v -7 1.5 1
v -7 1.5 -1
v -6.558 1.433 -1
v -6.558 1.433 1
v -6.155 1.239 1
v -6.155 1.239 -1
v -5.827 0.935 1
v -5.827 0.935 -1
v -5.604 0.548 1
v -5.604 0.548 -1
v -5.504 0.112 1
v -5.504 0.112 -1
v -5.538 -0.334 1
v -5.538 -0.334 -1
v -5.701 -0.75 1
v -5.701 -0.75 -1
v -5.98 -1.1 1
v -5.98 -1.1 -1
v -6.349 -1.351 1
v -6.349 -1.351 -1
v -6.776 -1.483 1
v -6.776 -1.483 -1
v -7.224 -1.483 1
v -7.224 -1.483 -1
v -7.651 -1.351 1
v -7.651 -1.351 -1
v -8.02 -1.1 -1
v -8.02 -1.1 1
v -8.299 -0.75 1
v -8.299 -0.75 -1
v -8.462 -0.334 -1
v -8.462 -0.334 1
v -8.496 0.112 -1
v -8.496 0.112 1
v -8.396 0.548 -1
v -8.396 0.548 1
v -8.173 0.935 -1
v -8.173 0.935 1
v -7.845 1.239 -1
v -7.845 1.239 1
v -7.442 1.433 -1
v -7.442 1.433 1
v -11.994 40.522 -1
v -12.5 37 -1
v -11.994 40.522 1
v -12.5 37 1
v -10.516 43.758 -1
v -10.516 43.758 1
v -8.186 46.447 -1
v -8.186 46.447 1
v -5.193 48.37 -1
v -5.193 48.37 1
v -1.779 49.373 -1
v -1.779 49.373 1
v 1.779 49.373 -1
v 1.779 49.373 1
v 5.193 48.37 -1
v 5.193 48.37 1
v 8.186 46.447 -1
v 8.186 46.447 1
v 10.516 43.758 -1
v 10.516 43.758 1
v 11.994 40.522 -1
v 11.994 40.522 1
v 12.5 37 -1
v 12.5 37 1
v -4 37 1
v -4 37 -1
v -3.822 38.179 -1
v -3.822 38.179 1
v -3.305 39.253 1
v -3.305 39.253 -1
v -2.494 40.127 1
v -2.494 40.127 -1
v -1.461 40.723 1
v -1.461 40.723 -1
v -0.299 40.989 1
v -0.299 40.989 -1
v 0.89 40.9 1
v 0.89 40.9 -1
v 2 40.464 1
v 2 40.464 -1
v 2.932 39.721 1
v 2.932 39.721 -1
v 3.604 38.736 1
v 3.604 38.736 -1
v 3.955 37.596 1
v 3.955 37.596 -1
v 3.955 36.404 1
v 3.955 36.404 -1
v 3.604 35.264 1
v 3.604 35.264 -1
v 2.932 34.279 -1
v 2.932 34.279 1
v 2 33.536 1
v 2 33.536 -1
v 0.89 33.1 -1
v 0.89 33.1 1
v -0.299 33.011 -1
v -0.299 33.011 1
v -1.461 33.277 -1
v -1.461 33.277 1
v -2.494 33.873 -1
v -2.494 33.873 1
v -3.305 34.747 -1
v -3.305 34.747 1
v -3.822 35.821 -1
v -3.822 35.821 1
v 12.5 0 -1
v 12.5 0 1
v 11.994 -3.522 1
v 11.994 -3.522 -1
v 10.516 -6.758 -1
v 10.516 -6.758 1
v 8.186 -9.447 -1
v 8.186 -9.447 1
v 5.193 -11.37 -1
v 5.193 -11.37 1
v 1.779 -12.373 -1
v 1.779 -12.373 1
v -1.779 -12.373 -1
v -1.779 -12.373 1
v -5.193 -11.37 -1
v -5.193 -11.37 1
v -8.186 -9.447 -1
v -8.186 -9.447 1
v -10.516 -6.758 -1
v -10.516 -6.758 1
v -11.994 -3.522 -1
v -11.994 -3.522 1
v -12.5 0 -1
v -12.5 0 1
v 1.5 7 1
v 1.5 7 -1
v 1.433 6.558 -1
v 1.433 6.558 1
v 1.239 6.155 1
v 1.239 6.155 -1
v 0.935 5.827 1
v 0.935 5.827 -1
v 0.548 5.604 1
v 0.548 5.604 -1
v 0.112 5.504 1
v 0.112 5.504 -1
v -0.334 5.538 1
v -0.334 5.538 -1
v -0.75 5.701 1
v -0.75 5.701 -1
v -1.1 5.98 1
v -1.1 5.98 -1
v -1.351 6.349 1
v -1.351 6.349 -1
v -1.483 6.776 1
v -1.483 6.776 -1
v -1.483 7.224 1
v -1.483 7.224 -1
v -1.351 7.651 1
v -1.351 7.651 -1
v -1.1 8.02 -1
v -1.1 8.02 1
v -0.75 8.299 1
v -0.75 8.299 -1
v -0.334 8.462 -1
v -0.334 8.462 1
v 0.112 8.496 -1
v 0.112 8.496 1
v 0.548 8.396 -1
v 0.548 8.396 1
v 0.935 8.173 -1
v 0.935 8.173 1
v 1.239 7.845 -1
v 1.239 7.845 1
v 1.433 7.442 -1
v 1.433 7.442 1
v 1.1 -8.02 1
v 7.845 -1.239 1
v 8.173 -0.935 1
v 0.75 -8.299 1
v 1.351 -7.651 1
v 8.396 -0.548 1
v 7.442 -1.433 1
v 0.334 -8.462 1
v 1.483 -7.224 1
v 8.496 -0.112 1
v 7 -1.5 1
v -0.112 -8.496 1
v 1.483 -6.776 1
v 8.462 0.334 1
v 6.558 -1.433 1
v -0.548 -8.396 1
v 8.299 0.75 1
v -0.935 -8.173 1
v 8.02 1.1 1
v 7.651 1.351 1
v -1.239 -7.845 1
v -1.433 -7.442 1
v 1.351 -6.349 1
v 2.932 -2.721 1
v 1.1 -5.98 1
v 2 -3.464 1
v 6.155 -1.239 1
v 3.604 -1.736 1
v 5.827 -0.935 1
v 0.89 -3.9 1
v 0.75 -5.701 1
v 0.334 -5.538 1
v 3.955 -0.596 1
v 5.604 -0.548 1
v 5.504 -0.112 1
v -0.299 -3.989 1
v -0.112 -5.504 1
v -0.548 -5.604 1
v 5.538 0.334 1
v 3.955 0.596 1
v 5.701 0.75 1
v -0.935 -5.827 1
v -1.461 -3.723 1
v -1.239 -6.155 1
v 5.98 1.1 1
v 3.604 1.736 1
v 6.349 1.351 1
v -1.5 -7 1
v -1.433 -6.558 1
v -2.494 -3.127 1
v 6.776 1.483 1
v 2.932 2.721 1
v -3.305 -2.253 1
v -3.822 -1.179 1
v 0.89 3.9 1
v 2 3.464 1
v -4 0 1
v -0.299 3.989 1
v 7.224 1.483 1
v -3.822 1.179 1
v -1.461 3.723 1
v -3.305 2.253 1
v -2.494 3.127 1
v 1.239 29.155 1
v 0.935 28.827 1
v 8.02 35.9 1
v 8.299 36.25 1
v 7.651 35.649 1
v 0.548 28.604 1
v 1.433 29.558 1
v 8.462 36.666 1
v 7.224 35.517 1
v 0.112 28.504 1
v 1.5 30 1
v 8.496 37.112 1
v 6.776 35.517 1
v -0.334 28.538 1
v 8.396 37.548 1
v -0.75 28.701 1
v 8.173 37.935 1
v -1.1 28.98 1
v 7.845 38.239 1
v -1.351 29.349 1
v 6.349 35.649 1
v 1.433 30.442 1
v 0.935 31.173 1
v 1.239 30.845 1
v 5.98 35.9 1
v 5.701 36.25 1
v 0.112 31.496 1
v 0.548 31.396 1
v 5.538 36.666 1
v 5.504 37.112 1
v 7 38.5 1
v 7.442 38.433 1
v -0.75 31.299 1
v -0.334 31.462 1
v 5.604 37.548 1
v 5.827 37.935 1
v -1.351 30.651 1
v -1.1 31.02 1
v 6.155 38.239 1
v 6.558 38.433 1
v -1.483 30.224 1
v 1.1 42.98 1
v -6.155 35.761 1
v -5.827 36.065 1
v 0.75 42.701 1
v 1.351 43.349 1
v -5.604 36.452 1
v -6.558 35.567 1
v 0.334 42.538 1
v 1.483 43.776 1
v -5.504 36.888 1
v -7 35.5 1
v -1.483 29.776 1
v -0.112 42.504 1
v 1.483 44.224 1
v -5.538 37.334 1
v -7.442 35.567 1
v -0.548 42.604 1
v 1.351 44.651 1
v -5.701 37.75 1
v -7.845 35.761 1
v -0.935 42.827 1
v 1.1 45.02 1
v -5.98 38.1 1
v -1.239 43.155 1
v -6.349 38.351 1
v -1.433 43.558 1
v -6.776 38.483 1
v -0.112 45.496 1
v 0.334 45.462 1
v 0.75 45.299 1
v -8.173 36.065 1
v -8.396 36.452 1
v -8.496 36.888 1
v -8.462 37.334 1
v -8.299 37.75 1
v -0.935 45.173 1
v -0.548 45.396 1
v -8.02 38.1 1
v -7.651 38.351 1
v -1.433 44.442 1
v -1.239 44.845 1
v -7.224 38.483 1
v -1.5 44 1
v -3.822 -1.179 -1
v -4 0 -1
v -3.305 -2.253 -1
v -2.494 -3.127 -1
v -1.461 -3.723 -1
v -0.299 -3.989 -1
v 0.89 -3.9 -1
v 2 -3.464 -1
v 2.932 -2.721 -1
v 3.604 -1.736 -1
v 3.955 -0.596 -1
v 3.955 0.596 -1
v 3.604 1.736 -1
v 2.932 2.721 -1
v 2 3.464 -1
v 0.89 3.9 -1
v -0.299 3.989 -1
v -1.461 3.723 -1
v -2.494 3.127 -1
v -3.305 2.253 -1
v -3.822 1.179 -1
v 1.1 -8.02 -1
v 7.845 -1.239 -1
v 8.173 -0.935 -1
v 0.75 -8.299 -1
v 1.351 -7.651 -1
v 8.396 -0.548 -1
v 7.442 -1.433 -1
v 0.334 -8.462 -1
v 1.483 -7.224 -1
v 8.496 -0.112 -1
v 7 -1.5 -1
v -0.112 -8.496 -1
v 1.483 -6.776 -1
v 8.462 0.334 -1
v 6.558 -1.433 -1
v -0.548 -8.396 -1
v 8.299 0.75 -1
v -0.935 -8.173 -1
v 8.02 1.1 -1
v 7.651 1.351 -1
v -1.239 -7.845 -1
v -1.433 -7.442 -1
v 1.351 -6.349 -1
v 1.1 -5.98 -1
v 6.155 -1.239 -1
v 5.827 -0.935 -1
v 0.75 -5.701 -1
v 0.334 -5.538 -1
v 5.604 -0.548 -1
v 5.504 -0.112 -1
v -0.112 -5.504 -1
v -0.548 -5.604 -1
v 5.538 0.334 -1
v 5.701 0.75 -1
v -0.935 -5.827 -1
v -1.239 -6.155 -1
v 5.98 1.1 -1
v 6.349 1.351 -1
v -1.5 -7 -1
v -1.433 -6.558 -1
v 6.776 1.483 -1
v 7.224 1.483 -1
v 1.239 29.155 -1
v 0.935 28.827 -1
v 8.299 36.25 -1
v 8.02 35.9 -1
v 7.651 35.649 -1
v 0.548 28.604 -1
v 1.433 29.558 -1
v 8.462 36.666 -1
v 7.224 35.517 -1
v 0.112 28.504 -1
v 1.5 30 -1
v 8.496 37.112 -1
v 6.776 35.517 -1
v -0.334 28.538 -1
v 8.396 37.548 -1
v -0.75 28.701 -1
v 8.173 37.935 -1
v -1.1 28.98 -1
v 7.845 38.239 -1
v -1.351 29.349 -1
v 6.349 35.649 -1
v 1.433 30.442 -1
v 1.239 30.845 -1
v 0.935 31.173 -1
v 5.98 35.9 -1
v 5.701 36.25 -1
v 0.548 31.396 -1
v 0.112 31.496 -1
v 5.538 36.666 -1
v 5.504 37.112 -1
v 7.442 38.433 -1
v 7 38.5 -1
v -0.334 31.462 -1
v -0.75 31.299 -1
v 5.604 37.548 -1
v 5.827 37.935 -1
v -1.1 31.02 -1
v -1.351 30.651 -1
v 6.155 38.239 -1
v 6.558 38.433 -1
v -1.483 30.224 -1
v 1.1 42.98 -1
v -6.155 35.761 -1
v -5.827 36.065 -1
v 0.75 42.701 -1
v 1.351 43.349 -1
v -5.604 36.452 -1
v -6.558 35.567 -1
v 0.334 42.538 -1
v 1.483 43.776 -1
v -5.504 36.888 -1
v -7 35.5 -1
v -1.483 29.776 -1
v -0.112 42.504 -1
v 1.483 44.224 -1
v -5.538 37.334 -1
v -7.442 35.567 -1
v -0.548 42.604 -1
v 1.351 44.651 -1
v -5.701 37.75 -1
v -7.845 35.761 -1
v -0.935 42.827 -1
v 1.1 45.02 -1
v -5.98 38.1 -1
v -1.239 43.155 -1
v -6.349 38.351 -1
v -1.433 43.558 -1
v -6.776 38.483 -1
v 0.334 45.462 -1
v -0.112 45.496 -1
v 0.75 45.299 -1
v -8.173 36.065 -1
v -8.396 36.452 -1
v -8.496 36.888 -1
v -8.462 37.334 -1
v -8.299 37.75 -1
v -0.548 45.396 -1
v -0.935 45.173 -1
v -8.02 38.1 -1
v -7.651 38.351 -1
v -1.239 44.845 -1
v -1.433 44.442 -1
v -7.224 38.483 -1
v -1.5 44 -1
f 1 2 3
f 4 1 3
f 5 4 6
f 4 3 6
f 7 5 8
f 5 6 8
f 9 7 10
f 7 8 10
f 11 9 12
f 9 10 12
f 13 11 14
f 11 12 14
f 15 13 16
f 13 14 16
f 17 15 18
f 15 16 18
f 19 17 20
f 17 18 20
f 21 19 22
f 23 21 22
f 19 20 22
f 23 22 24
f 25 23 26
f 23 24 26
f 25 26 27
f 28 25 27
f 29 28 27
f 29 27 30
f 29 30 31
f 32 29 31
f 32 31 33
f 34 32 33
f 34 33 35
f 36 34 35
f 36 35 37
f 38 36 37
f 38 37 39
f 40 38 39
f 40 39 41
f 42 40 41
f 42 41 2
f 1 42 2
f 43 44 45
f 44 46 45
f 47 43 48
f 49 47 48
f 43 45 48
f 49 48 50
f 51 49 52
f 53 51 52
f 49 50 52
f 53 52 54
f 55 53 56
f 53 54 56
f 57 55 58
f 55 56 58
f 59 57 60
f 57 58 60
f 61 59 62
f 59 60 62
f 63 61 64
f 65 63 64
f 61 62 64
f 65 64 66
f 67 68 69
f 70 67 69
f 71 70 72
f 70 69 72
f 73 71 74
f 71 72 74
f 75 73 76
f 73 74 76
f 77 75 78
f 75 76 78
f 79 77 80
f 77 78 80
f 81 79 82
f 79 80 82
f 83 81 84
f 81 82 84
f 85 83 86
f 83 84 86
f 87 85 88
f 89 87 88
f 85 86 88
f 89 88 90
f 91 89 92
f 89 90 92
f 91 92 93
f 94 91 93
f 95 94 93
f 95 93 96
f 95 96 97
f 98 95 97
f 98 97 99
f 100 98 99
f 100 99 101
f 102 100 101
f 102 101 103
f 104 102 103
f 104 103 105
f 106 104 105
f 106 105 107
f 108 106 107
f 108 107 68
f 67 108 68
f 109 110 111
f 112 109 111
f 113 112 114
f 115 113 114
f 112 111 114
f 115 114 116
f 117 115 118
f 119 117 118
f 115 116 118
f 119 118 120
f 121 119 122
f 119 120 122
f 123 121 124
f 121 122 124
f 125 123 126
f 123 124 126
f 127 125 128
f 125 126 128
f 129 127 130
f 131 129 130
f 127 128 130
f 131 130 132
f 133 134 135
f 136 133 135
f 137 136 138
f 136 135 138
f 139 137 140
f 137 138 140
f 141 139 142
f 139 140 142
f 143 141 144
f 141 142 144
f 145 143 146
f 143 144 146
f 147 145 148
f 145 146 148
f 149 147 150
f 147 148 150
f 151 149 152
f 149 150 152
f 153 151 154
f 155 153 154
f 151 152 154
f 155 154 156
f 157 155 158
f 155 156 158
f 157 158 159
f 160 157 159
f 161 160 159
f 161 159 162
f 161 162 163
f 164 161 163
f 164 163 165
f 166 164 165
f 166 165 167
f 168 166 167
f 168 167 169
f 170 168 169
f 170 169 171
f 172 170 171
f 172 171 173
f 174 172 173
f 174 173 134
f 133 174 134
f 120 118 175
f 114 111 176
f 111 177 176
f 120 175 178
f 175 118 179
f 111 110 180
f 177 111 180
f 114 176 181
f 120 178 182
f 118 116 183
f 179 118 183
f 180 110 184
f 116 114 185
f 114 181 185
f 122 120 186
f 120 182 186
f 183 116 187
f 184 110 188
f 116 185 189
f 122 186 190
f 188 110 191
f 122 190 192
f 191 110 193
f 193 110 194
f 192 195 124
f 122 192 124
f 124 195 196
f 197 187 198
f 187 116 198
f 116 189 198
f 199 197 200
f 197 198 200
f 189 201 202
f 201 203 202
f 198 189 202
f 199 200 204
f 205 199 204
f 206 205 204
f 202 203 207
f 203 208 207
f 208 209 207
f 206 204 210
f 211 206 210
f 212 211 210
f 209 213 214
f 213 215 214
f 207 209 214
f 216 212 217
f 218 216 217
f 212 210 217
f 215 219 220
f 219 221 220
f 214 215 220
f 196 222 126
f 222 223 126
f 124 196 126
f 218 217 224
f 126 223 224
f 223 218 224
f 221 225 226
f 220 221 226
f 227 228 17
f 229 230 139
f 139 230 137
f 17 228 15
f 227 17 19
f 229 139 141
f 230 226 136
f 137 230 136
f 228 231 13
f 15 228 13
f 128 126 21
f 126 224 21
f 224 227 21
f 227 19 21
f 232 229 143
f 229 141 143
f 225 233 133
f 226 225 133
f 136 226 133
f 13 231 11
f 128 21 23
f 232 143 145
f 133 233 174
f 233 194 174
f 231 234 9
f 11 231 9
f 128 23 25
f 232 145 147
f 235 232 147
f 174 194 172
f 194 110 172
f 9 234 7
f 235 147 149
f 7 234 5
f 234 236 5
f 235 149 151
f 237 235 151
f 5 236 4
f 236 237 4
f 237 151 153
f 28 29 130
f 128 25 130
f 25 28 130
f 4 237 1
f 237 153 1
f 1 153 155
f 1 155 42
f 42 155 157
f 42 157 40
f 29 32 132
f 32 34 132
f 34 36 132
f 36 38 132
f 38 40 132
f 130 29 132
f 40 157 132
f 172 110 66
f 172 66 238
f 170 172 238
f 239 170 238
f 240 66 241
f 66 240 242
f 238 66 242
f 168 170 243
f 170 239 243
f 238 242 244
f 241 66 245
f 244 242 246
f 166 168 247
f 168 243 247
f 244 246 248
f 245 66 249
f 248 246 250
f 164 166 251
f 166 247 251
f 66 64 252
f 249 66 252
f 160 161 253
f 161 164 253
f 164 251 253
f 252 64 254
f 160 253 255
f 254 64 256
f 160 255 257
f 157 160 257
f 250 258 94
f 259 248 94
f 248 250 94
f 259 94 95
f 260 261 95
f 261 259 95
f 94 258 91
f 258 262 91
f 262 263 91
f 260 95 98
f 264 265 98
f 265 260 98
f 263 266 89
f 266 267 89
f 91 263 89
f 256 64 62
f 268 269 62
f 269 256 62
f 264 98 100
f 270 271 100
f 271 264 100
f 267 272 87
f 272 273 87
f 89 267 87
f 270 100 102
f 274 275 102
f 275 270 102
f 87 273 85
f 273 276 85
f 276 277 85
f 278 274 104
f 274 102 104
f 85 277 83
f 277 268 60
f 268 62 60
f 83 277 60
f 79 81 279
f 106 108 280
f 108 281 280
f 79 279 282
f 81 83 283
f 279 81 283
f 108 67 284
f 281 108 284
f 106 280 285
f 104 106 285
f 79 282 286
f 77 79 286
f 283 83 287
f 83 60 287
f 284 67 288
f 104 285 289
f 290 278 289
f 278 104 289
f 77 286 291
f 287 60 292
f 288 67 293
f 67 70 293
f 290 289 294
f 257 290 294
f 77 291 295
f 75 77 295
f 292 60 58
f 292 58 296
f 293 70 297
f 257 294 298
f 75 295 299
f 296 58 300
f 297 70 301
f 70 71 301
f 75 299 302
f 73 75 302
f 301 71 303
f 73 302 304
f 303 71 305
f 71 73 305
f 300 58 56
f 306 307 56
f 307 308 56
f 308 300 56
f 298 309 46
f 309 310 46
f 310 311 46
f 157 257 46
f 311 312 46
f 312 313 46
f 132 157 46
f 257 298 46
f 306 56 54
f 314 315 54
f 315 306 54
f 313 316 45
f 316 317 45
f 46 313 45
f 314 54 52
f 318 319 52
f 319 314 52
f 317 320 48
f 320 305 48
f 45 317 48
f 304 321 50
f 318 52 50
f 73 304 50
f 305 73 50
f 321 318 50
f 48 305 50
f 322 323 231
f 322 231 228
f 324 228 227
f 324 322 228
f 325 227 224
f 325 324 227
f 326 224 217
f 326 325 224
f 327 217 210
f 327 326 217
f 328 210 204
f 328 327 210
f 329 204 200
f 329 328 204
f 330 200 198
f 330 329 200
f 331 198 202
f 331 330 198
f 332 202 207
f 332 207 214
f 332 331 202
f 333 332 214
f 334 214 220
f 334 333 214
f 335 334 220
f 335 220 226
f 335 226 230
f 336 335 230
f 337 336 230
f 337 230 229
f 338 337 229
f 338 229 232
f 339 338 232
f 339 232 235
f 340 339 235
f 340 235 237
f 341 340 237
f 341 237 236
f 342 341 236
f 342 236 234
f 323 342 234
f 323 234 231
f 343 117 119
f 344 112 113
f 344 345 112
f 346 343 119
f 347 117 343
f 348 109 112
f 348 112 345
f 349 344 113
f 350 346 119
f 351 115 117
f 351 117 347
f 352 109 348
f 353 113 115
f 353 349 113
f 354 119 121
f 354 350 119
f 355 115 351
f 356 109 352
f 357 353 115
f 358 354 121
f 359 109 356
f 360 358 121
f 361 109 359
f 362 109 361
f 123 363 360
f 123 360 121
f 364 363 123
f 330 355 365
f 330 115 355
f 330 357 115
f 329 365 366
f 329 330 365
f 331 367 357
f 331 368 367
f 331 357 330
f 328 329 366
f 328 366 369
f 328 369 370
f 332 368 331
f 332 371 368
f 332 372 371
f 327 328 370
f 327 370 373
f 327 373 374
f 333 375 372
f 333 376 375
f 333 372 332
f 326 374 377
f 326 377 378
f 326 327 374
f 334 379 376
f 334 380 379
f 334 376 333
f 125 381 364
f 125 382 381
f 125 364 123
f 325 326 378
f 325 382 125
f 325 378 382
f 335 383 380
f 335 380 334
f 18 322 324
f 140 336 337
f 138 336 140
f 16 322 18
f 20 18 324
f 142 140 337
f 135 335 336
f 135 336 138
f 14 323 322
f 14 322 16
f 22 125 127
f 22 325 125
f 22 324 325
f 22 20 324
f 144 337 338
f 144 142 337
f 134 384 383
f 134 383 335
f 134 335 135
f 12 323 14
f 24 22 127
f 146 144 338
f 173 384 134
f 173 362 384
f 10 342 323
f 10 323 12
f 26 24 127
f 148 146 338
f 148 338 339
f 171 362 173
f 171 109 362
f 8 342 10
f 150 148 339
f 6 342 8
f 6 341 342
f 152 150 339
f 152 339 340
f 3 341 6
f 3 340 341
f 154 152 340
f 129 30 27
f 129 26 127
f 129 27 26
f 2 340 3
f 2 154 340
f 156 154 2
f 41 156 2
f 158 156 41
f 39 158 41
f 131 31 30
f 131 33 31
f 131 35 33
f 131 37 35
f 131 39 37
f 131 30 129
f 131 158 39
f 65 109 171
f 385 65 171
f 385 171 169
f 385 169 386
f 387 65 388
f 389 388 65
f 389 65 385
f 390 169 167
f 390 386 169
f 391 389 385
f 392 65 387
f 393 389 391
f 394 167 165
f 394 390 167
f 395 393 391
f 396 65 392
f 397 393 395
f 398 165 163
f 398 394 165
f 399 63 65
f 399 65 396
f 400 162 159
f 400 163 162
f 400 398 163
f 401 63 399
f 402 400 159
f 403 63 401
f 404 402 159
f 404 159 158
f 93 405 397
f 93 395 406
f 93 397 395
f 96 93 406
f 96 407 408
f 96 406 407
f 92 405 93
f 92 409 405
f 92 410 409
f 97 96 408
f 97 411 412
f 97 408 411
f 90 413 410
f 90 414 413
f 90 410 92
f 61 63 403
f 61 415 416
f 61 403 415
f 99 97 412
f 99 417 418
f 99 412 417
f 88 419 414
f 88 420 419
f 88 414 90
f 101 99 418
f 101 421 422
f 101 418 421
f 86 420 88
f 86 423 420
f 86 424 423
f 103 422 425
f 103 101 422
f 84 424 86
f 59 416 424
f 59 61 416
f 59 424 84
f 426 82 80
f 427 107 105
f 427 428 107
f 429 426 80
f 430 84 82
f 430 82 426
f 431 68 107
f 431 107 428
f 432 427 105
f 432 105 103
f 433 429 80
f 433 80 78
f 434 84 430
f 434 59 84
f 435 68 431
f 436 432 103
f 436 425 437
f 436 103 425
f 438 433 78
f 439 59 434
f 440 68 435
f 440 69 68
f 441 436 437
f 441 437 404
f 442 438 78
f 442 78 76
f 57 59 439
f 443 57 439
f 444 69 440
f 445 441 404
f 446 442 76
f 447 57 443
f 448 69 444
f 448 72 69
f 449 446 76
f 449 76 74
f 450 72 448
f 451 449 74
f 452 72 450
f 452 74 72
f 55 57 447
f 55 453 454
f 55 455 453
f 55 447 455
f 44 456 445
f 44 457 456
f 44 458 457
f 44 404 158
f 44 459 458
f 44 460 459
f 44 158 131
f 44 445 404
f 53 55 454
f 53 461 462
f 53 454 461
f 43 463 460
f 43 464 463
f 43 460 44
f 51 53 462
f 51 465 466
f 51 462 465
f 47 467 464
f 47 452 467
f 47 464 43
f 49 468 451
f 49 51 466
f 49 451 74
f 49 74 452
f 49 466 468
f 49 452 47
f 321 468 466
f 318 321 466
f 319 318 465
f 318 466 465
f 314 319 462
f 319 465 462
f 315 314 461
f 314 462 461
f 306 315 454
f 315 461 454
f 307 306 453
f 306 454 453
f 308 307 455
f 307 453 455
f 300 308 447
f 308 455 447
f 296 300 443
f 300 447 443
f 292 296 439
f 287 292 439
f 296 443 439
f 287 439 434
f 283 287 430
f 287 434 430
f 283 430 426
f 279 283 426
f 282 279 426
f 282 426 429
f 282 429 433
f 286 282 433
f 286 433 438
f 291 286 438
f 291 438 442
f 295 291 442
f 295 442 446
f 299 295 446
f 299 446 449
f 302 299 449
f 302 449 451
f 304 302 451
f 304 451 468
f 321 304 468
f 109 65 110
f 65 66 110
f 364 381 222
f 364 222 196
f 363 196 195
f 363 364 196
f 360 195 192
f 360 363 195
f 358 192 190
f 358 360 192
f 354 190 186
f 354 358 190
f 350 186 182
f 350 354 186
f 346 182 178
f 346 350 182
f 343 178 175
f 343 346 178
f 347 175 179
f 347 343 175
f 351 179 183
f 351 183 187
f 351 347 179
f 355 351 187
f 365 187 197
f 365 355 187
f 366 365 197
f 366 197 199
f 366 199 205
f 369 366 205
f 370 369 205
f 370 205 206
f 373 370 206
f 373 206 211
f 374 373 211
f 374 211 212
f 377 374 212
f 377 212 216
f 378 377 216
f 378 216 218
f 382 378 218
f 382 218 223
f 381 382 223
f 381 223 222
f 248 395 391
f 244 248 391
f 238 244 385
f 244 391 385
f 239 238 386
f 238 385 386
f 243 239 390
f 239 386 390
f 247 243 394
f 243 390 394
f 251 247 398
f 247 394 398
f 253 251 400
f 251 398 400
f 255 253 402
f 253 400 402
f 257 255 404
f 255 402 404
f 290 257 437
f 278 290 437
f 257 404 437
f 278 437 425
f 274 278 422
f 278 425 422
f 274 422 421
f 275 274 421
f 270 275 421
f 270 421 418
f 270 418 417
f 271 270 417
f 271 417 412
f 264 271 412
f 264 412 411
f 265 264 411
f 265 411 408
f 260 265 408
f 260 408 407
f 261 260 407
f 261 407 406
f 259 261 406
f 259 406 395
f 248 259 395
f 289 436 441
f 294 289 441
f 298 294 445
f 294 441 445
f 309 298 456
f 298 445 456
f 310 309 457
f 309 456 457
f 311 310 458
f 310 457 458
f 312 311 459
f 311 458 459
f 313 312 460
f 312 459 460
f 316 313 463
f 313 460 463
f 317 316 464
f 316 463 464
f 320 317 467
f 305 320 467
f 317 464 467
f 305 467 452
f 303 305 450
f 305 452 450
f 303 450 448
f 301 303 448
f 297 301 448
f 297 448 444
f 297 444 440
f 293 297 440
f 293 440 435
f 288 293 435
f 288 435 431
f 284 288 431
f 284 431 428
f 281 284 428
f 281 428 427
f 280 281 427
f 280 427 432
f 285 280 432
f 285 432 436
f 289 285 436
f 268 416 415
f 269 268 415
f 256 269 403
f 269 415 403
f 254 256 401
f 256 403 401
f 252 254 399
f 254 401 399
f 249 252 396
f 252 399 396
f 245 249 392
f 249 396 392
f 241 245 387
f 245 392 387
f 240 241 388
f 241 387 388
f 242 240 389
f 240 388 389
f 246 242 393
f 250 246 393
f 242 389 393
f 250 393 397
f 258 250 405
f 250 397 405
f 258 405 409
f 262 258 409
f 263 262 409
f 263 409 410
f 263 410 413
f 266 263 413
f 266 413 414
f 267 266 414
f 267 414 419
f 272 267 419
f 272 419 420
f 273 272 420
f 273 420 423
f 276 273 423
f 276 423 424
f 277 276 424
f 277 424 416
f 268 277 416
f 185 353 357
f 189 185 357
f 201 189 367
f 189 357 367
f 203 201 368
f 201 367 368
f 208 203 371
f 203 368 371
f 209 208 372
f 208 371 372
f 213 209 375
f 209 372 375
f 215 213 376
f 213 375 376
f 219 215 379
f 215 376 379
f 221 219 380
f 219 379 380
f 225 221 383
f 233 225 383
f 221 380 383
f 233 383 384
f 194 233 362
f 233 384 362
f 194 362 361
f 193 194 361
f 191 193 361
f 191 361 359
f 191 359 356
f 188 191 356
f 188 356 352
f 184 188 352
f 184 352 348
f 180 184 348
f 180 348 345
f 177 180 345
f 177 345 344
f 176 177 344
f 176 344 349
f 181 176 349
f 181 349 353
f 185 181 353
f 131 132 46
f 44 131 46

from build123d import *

# Parameters (mm, degrees)
BOSS_EXTRUDE1_DEPTH     = 1
CUT_EXTRUDE1_REACH      = 53.093
SKETCH2_R               = 4
CUT_EXTRUDE2_REACH      = 53.093
SKETCH2_3_R             = 1.5
CIRPATTERN1_COUNT       = 4
MIRROR1_COPY_1_REACH    = 53.093
MIRROR1_COPY_1_SKETCH_R = 1.5
MIRROR1_COPY_2_REACH    = 53.093
MIRROR1_COPY_2_SKETCH_R = 1.5
MIRROR1_COPY_3_REACH    = 53.093
MIRROR1_COPY_3_SKETCH_R = 1.5


with BuildPart() as part:
    # Sketch1 → Boss-Extrude1 (new, symmetric)
    with BuildSketch(Plane.XY):
        with BuildLine():
            Line((-12.5, 0), (-12.5, 37))
            ThreePointArc((-12.5, 37), (0, 49.5), (12.5, 37))
            Line((12.5, 37), (12.5, 0))
            ThreePointArc((12.5, 0), (0, -12.5), (-12.5, 0))
        make_face()
    extrude(amount=BOSS_EXTRUDE1_DEPTH, both=True)

    # Sketch2 → Cut-Extrude1 (cut, up to next)
    with BuildSketch(Plane(origin=(0, 0, -1), x_dir=(-1, 0, 0), z_dir=(0, 0, -1)), mode=Mode.PRIVATE) as cut_extrude1_sk1:
        with Locations((0, 37)):
            Circle(SKETCH2_R)
    cut_extrude1_tool1 = extrude(cut_extrude1_sk1.sketch, amount=-CUT_EXTRUDE1_REACH, mode=Mode.PRIVATE) & part.part
    cut_extrude1 = cut_extrude1_tool1.solids().sort_by_distance((0, 37, -1))[0]
    add(cut_extrude1, mode=Mode.SUBTRACT)

    # Sketch2<3> → Cut-Extrude2 (cut, up to next)
    with BuildSketch(Plane(origin=(0, 0, -1), x_dir=(-1, 0, 0), z_dir=(0, 0, -1)), mode=Mode.PRIVATE) as cut_extrude2_sk1:
        with Locations((0, 44)):
            Circle(SKETCH2_3_R)
    cut_extrude2_tool1 = extrude(cut_extrude2_sk1.sketch, amount=-CUT_EXTRUDE2_REACH, mode=Mode.PRIVATE) & part.part
    cut_extrude2 = cut_extrude2_tool1.solids().sort_by_distance((0, 44, -1))[0]
    add(cut_extrude2, mode=Mode.SUBTRACT)

    # CirPattern1: Cut-Extrude2 ×4 about axis
    cirpattern1_axis = Axis((0, 37, -1), (0, 0, -1))
    for i in range(1, CIRPATTERN1_COUNT):
        add(cut_extrude2.rotate(cirpattern1_axis, i * 360 / CIRPATTERN1_COUNT), mode=Mode.SUBTRACT)

    # Mirror1: Cut-Extrude1, Cut-Extrude2 across plane
    add(cut_extrude1.mirror(Plane.ZX.offset(18.5)), mode=Mode.SUBTRACT)
    add(cut_extrude2.mirror(Plane.ZX.offset(18.5)), mode=Mode.SUBTRACT)

    # Mirror1 copy 1 sketch → Mirror1 copy 1 (cut, up to next)
    with BuildSketch(Plane(origin=(-37, 0, -1), x_dir=(0, -1, 0), z_dir=(0, 0, -1)), mode=Mode.PRIVATE) as mirror1_copy_1_sk1:
        with Locations((0, -44)):
            Circle(MIRROR1_COPY_1_SKETCH_R)
    mirror1_copy_1_tool1 = extrude(mirror1_copy_1_sk1.sketch, amount=-MIRROR1_COPY_1_REACH, mode=Mode.PRIVATE) & part.part
    add(mirror1_copy_1_tool1.solids().sort_by_distance((7, 0, -1))[0], mode=Mode.SUBTRACT)

    # Mirror1 copy 2 sketch → Mirror1 copy 2 (cut, up to next)
    with BuildSketch(Plane(origin=(0, -37, -1), x_dir=(1, 0, 0), z_dir=(0, 0, -1)), mode=Mode.PRIVATE) as mirror1_copy_2_sk1:
        with Locations((0, -44)):
            Circle(MIRROR1_COPY_2_SKETCH_R)
    mirror1_copy_2_tool1 = extrude(mirror1_copy_2_sk1.sketch, amount=-MIRROR1_COPY_2_REACH, mode=Mode.PRIVATE) & part.part
    add(mirror1_copy_2_tool1.solids().sort_by_distance((0, 7, -1))[0], mode=Mode.SUBTRACT)

    # Mirror1 copy 3 sketch → Mirror1 copy 3 (cut, up to next)
    with BuildSketch(Plane(origin=(37, 0, -1), x_dir=(0, 1, 0), z_dir=(0, 0, -1)), mode=Mode.PRIVATE) as mirror1_copy_3_sk1:
        with Locations((0, -44)):
            Circle(MIRROR1_COPY_3_SKETCH_R)
    mirror1_copy_3_tool1 = extrude(mirror1_copy_3_sk1.sketch, amount=-MIRROR1_COPY_3_REACH, mode=Mode.PRIVATE) & part.part
    add(mirror1_copy_3_tool1.solids().sort_by_distance((-7, 0, -1))[0], mode=Mode.SUBTRACT)


solid = part.part
